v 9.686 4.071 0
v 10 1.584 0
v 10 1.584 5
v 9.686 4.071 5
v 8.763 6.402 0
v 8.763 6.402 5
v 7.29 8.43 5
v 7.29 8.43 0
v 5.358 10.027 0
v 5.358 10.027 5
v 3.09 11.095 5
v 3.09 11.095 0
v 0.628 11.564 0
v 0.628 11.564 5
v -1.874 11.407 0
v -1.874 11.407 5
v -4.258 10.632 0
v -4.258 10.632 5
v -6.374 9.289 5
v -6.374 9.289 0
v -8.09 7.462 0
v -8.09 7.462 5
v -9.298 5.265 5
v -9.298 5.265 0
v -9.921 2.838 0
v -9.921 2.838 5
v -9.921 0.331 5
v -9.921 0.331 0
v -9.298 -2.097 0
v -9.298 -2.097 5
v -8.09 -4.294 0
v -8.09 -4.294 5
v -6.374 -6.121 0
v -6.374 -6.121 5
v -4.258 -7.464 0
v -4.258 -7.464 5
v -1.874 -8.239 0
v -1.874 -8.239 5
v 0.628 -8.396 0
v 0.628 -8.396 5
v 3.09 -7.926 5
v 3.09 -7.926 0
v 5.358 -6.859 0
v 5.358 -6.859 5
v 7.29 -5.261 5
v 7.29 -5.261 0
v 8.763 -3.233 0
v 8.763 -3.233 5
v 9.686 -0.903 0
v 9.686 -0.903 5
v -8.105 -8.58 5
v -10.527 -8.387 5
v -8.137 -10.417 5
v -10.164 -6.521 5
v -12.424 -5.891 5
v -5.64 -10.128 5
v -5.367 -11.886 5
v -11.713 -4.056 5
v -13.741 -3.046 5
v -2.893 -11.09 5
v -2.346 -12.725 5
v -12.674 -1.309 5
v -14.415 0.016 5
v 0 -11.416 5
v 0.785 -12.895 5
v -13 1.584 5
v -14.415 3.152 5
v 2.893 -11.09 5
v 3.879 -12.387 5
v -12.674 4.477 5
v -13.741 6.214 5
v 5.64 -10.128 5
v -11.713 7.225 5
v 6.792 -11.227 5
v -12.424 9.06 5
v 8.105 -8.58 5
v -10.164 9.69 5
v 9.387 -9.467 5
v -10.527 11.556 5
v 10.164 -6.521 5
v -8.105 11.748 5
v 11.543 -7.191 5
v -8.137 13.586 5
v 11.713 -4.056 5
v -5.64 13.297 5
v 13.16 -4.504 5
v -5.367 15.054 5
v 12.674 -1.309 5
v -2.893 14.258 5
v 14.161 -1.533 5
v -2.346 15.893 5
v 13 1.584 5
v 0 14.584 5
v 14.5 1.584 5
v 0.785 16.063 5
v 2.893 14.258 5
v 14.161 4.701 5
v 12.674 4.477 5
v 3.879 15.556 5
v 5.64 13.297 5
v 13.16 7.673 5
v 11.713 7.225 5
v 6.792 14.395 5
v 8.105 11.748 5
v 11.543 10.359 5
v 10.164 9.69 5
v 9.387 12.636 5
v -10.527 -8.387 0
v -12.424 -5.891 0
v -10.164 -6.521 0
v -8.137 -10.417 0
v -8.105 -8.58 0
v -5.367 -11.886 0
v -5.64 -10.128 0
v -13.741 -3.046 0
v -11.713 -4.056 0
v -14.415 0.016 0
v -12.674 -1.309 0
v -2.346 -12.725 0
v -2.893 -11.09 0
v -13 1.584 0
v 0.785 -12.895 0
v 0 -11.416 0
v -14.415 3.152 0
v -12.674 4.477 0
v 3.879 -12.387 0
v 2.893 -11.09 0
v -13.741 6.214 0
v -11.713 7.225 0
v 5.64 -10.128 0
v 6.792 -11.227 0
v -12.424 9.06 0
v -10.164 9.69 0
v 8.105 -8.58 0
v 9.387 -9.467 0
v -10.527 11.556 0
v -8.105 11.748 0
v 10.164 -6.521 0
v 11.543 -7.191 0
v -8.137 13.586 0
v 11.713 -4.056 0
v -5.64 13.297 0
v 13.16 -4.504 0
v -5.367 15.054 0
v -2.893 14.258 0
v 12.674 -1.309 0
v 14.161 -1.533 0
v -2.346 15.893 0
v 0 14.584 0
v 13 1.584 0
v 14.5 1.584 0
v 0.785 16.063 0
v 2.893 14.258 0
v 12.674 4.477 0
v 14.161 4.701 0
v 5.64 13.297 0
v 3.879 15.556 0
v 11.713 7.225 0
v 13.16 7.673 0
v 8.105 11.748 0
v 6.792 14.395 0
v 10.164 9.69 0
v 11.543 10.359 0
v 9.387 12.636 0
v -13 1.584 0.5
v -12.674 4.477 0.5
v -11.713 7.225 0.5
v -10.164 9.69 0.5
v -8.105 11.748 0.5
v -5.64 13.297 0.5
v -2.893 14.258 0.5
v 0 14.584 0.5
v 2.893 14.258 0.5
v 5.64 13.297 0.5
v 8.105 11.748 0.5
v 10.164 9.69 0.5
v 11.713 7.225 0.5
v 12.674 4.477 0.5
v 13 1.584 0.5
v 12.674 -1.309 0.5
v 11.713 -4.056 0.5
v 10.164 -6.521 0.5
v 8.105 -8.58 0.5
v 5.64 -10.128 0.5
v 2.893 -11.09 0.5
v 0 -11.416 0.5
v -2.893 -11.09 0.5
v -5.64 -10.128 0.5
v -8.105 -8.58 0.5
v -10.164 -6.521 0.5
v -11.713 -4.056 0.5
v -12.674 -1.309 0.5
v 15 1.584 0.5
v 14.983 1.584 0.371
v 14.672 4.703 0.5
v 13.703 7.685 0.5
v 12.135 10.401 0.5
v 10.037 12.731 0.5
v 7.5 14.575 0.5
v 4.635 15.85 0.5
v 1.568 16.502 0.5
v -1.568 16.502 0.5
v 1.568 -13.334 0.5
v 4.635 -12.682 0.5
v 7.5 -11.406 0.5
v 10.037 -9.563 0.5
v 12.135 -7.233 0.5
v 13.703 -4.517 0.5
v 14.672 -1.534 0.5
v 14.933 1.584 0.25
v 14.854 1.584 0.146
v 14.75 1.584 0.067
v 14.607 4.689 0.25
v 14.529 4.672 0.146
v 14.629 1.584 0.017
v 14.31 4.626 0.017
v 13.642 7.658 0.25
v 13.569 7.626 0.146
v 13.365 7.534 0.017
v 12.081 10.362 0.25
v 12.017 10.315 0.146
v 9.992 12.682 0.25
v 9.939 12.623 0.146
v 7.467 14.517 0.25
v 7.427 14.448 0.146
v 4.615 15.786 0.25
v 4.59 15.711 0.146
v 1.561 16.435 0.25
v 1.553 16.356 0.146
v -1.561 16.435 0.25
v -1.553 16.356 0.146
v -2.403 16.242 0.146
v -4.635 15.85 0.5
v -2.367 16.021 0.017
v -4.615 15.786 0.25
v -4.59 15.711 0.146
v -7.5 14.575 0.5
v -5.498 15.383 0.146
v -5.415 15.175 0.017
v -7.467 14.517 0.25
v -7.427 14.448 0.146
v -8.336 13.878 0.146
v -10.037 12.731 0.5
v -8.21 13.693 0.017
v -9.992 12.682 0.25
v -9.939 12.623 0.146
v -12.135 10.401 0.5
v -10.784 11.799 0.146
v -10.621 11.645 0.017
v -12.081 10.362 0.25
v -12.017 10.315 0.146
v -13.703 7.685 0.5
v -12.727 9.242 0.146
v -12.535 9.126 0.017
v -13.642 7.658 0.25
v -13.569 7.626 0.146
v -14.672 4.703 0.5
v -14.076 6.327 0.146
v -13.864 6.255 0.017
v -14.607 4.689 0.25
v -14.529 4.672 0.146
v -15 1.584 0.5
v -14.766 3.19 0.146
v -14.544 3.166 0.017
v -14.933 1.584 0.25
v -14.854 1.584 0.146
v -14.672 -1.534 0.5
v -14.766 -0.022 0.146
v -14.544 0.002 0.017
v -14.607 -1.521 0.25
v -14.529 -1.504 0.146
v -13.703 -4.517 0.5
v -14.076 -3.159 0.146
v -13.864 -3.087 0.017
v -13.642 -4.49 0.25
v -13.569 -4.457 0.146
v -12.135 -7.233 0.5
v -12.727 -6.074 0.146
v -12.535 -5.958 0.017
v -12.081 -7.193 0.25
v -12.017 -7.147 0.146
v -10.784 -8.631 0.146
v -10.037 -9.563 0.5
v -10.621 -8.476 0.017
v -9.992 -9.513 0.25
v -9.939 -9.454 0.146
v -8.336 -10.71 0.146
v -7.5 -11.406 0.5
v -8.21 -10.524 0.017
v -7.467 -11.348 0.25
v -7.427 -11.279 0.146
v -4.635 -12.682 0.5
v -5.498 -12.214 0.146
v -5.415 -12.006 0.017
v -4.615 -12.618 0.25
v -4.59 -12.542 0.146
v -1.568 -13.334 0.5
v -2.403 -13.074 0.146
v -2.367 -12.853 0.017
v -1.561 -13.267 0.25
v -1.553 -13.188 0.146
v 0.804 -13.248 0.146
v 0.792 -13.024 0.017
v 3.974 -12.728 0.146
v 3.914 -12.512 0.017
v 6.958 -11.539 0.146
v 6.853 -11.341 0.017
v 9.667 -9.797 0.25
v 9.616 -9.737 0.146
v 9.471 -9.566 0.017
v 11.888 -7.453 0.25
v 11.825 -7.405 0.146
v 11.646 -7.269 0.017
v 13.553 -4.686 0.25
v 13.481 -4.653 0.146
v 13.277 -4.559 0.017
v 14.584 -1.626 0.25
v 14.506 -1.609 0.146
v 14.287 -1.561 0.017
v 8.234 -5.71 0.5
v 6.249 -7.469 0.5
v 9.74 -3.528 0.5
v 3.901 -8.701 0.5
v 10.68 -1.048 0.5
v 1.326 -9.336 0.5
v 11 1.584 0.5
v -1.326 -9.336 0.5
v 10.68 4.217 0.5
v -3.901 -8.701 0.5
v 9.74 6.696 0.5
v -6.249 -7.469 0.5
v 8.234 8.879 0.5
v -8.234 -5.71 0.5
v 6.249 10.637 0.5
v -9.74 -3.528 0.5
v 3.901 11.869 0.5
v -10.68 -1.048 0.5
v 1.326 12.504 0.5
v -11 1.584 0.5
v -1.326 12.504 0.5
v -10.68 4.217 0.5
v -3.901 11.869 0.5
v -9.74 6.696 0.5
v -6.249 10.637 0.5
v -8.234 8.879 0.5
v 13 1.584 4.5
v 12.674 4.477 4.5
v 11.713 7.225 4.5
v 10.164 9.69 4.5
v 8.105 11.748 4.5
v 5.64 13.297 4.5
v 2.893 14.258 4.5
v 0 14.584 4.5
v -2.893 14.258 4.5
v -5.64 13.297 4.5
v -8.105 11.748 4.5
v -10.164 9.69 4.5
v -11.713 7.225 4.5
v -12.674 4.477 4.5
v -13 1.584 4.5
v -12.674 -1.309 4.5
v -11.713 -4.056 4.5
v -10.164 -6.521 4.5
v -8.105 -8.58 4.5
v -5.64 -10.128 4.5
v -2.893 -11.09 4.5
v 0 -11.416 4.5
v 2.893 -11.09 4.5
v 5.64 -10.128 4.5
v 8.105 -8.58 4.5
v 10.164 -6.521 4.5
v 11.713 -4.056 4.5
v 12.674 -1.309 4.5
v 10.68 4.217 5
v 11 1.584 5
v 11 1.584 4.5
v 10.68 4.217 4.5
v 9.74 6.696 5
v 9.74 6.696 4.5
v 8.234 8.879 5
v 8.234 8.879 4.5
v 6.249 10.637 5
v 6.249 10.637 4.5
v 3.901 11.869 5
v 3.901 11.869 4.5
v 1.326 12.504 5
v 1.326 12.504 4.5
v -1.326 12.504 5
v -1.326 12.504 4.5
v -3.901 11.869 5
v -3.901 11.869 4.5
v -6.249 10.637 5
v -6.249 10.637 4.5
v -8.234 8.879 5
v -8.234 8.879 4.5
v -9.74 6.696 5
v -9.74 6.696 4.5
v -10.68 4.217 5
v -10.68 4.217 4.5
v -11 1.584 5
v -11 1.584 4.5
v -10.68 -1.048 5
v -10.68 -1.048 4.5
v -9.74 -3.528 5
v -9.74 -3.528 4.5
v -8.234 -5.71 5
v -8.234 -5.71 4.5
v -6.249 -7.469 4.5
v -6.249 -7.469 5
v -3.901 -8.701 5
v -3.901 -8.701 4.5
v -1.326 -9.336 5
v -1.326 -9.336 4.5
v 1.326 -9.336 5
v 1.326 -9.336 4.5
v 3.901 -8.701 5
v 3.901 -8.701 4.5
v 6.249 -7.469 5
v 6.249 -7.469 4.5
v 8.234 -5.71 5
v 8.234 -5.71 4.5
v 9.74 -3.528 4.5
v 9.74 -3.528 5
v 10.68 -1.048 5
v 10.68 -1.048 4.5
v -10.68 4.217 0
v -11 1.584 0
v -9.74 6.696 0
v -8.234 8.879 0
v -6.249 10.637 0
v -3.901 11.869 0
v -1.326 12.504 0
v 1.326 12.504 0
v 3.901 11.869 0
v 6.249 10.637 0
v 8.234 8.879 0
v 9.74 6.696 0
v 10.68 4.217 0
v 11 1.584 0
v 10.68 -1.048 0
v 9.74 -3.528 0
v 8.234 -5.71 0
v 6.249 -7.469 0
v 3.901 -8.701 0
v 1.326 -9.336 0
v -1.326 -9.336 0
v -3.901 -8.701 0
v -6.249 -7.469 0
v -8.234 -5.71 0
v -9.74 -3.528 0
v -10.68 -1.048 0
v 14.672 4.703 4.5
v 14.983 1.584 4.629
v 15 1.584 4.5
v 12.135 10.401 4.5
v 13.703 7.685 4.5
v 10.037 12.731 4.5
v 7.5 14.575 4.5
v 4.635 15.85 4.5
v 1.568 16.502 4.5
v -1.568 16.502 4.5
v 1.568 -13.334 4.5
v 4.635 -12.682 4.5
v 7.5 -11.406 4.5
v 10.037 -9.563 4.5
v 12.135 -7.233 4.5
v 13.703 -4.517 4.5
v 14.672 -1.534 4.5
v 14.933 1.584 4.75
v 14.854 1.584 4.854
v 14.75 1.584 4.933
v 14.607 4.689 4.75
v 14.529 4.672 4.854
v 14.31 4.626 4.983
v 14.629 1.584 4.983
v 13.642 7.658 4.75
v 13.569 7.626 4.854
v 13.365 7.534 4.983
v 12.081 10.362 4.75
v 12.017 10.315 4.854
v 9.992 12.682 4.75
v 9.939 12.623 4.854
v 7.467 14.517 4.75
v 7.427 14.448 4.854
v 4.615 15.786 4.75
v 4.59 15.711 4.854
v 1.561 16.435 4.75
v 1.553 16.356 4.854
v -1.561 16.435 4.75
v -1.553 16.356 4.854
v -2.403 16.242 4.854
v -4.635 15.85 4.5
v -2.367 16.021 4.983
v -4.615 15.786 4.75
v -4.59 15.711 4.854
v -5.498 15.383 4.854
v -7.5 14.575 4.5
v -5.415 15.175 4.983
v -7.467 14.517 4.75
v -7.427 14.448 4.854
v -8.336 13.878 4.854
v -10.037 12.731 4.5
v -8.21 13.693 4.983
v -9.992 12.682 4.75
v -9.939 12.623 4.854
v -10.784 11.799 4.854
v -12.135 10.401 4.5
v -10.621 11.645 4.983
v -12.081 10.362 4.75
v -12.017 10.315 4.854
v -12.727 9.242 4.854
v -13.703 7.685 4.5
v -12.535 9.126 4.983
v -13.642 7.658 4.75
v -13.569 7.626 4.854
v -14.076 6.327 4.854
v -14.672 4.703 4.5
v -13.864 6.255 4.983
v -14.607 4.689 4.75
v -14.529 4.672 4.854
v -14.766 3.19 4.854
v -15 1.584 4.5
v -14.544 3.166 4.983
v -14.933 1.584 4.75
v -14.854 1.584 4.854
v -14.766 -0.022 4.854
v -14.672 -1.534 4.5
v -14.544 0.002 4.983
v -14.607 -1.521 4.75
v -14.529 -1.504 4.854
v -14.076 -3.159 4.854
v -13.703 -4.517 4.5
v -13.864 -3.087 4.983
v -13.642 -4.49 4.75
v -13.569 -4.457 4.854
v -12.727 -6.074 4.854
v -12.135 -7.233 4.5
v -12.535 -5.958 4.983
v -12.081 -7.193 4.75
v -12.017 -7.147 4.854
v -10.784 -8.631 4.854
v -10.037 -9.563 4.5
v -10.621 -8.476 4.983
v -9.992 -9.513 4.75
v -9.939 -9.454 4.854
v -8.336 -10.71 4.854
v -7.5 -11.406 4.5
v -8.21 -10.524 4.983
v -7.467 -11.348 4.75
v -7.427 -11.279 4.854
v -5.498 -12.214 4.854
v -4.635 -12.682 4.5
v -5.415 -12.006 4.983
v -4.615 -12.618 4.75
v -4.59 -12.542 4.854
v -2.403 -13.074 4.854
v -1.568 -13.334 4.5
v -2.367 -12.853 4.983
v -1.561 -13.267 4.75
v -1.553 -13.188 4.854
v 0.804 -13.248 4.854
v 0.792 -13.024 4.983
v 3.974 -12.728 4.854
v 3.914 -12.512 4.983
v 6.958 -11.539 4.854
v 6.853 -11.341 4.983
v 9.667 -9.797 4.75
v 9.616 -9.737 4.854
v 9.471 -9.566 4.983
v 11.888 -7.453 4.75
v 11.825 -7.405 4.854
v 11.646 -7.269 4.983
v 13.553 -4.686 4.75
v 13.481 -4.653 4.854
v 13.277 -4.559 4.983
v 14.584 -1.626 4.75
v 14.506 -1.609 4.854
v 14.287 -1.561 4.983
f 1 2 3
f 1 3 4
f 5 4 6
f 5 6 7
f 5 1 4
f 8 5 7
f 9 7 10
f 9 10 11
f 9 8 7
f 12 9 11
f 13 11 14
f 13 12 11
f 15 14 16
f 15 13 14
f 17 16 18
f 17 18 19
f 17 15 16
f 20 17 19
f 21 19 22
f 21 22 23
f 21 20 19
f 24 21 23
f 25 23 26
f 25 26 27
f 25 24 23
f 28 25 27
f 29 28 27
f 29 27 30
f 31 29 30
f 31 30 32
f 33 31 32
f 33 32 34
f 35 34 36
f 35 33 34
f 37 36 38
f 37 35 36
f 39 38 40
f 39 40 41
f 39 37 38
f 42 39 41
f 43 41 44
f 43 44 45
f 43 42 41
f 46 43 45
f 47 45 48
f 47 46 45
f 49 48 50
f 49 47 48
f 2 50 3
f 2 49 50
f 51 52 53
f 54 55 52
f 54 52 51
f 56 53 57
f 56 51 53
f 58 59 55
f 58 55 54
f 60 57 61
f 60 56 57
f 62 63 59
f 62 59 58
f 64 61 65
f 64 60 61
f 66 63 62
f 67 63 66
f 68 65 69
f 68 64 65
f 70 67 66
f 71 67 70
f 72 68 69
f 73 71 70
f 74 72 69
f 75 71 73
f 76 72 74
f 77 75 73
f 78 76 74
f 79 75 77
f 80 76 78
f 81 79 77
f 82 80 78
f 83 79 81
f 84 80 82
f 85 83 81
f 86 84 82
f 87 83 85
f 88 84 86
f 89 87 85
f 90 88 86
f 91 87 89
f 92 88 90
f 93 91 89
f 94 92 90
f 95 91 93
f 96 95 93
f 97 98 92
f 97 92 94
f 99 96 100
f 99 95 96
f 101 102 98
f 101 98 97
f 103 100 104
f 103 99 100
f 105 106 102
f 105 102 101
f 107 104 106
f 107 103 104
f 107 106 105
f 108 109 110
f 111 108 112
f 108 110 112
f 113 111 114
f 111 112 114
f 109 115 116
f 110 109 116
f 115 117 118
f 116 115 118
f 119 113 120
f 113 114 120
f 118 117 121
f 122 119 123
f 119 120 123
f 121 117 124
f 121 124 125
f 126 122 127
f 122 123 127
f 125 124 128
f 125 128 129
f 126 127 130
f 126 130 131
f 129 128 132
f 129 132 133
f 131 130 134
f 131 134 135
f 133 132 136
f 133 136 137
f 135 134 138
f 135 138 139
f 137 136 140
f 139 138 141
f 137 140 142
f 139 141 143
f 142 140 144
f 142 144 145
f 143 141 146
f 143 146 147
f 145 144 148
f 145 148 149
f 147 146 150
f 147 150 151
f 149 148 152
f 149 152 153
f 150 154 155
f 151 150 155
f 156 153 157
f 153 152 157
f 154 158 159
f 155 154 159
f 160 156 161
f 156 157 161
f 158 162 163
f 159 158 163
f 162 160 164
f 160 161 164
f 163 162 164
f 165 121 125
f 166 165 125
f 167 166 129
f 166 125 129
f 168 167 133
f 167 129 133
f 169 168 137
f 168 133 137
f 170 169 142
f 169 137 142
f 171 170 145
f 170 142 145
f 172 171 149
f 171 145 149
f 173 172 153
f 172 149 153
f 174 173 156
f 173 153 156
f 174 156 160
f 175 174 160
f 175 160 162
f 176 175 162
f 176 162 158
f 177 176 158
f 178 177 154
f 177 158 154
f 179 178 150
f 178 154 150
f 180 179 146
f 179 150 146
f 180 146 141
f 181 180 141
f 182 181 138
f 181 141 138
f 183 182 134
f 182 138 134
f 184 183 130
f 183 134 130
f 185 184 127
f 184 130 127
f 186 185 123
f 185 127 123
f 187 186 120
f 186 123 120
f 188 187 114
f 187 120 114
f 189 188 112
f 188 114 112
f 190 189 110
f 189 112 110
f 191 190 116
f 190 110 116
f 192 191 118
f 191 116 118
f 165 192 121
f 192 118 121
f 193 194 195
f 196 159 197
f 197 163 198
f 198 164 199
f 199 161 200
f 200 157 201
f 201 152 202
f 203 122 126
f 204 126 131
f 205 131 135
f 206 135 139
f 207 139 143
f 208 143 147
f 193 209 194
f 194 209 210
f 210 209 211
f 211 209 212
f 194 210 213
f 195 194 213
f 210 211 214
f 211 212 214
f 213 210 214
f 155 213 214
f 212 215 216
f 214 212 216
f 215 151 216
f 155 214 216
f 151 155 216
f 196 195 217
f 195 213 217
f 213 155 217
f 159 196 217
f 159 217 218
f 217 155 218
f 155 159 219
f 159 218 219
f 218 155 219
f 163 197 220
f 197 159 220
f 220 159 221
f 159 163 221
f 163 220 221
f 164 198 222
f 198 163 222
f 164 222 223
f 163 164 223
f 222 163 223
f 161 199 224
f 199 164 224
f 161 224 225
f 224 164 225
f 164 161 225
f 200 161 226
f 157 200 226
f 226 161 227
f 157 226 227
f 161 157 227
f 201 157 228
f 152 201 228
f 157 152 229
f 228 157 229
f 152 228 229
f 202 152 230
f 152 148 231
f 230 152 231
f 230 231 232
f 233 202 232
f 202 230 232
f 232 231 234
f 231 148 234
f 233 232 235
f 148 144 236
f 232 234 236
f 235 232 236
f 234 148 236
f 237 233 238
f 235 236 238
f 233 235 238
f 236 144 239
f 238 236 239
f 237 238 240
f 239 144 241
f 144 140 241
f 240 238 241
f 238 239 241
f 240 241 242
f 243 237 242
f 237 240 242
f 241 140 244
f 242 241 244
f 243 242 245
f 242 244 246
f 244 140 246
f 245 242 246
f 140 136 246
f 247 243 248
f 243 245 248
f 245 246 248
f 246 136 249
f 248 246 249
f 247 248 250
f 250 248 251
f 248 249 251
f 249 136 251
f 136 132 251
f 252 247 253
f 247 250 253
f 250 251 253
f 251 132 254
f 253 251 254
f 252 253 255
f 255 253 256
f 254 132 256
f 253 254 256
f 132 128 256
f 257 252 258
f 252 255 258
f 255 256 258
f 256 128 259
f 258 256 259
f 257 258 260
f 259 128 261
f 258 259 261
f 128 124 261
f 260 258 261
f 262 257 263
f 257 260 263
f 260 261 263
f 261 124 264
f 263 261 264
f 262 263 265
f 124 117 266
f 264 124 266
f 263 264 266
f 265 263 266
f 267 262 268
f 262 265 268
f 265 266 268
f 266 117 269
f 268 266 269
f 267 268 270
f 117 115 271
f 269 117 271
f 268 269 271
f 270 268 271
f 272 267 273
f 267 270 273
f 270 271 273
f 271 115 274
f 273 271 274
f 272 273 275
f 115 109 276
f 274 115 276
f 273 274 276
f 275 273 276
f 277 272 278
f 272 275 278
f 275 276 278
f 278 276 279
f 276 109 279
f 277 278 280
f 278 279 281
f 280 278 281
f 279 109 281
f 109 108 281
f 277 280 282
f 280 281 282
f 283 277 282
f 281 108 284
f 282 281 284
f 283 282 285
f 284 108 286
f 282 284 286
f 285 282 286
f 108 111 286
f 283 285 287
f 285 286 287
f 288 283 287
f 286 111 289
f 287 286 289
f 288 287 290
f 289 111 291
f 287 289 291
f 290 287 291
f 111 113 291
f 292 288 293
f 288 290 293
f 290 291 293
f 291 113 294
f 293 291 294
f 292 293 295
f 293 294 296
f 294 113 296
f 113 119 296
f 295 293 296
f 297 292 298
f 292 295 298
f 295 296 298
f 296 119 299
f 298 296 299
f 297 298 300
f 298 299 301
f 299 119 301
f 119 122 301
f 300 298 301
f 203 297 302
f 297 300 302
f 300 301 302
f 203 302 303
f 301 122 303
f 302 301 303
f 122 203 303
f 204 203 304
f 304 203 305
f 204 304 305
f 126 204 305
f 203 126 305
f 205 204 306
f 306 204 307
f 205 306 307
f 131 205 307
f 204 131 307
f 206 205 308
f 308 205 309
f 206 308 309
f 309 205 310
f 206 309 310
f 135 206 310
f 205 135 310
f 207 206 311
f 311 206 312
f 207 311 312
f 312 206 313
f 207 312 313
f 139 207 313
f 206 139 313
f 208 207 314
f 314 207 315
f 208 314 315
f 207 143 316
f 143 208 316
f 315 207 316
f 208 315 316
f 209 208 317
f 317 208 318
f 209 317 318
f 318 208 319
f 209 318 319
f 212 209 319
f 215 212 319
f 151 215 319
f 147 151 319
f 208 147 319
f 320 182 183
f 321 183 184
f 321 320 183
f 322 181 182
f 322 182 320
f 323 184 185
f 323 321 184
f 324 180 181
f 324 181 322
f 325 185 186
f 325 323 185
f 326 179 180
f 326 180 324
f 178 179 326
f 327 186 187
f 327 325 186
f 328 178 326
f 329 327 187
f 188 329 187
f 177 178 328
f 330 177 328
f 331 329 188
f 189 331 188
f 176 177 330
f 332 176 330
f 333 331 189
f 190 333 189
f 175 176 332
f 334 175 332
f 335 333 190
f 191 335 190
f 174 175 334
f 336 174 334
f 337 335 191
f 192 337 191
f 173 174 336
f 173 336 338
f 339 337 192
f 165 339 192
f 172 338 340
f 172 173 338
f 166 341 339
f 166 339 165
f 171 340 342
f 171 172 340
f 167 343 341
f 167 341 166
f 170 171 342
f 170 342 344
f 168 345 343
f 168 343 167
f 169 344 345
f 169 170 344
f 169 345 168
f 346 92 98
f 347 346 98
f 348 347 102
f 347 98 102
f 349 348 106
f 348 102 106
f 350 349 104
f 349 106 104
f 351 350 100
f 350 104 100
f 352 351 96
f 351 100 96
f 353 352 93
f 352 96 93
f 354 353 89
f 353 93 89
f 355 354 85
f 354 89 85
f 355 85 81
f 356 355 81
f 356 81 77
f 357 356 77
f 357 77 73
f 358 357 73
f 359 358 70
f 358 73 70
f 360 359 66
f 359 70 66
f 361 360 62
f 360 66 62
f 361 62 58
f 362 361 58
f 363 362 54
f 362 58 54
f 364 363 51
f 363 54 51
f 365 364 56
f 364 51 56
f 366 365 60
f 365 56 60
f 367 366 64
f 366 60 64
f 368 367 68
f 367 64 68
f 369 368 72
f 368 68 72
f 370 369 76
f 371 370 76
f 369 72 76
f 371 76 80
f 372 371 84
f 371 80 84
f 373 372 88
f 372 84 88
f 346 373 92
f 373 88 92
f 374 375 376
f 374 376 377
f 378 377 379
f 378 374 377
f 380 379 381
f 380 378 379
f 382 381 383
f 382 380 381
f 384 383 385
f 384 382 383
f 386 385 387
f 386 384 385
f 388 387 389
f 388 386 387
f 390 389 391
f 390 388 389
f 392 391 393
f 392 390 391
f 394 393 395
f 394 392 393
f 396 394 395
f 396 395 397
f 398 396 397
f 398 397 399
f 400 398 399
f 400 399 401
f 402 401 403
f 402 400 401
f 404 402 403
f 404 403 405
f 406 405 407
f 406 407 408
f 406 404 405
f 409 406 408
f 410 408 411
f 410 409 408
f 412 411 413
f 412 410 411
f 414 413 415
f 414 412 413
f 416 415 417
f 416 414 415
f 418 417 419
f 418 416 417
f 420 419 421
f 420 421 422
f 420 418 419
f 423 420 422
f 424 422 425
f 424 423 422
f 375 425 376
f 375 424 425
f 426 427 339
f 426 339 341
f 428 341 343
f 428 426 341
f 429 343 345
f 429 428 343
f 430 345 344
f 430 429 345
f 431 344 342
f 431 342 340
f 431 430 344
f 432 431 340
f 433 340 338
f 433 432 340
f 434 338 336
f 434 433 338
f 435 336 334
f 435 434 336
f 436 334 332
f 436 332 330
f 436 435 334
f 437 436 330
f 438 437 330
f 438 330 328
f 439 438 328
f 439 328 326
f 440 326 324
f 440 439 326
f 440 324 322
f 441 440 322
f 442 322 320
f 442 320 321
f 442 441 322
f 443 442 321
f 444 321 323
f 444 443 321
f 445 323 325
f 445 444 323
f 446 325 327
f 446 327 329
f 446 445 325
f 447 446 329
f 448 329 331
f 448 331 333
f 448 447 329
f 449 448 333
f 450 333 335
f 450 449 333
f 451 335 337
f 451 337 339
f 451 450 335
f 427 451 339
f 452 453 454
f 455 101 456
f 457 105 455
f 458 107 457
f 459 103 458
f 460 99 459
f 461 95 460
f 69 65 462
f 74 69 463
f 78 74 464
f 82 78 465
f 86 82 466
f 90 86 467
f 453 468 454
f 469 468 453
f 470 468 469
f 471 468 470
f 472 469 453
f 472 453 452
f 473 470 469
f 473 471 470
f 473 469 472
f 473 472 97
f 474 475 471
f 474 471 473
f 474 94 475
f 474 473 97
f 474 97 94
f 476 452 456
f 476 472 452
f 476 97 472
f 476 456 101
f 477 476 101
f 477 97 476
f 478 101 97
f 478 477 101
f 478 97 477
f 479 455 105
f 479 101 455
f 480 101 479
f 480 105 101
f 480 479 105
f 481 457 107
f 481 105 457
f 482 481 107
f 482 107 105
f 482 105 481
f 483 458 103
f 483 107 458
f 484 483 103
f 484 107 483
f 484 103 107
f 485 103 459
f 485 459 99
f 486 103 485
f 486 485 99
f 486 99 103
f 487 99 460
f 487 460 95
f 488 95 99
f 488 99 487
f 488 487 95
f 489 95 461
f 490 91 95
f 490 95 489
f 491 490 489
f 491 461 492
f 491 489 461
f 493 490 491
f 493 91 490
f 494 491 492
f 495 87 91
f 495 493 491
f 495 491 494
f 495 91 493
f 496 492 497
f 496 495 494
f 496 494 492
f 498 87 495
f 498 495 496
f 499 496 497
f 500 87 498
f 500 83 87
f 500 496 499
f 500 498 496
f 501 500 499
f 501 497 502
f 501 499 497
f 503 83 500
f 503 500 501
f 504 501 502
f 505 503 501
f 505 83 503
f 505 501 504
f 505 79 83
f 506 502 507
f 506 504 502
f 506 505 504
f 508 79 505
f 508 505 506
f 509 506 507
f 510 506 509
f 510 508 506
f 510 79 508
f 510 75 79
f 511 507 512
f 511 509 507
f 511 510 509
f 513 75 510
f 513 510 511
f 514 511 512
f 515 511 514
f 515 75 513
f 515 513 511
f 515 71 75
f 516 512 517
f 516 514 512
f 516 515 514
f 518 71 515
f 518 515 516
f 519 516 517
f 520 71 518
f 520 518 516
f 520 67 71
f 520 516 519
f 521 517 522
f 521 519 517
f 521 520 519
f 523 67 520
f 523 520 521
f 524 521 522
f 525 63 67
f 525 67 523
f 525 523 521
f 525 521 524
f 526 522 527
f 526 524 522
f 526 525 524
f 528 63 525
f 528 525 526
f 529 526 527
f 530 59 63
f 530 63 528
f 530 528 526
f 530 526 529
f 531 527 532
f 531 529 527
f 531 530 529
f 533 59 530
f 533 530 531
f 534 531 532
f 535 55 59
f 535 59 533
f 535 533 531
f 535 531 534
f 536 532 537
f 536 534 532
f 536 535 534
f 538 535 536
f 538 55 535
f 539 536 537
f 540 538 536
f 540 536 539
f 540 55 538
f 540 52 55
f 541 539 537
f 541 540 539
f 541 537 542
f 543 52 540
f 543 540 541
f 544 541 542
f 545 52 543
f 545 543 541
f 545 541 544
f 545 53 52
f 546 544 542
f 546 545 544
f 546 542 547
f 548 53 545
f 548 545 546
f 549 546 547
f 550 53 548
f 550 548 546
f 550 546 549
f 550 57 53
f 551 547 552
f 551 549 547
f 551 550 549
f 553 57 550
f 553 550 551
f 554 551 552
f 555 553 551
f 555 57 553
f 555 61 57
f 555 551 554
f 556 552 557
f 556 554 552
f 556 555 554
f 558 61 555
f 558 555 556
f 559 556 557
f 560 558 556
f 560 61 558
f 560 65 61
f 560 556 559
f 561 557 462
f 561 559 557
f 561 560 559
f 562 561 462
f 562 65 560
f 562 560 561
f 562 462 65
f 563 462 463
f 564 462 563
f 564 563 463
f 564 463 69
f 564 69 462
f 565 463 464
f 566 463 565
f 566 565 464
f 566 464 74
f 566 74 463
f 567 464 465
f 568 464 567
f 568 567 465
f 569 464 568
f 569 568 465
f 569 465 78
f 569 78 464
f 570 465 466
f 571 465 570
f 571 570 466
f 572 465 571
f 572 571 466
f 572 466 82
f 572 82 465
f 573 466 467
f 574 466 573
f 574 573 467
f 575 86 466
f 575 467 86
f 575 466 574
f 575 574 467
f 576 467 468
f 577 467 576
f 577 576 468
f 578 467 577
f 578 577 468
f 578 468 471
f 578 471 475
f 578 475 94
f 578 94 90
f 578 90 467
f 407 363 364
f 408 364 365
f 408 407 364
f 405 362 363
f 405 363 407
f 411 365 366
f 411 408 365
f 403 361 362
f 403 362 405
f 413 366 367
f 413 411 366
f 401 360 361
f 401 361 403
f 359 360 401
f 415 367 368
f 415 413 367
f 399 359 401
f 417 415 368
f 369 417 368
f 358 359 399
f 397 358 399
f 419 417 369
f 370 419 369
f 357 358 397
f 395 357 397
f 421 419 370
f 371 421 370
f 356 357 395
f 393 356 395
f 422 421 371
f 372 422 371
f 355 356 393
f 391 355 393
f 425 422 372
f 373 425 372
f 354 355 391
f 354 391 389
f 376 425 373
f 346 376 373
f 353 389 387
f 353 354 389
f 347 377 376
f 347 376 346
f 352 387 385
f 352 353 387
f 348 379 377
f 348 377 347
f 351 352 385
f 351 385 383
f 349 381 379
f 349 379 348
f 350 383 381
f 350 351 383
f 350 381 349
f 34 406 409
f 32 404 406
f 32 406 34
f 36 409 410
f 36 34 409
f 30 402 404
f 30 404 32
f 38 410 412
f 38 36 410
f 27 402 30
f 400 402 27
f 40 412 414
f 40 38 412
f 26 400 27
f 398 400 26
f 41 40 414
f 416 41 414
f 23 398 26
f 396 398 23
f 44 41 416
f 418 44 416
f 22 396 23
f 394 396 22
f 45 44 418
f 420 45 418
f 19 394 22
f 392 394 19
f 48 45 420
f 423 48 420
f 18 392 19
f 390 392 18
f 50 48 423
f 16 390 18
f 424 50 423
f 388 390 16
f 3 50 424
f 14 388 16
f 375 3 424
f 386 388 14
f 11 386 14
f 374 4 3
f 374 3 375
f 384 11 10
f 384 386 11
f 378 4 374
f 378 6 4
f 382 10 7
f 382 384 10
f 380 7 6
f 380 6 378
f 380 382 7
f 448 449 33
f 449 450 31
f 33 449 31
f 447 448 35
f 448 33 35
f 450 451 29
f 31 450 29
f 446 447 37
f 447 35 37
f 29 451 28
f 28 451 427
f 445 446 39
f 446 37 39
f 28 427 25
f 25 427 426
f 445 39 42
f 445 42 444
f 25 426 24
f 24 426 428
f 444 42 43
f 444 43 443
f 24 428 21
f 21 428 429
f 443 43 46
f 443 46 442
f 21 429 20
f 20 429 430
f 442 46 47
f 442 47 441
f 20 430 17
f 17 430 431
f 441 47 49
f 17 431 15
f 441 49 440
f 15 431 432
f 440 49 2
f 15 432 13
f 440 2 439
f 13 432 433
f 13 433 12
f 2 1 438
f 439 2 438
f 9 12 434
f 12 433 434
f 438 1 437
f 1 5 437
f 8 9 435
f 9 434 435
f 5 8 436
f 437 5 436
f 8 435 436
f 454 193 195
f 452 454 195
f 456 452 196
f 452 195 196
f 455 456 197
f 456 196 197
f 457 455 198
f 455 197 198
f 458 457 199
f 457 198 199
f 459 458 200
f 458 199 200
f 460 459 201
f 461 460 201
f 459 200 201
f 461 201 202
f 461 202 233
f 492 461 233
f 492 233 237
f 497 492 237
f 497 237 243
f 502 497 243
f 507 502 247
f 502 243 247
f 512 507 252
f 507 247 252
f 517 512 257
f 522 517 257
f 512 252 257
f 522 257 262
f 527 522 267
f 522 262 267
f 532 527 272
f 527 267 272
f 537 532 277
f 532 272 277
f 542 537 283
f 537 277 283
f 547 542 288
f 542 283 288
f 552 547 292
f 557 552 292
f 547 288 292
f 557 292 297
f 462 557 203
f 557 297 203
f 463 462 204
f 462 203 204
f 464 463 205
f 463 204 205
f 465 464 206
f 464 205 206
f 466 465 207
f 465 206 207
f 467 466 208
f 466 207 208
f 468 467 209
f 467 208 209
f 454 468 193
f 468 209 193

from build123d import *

# Parameters (mm, degrees)
SKETCH1_R           = 15
SKETCH1_R_2         = 10
BOSS_EXTRUDE1_DEPTH = 5
FILLET1_R           = 0.5
SKETCH2_R           = 13
SKETCH2_R_2         = 11
CUT_EXTRUDE1_DEPTH  = 0.5
SKETCH3_R           = 13
SKETCH3_R_2         = 11
CUT_EXTRUDE2_DEPTH  = 0.5


with BuildPart() as part:
    # Sketch1 → Boss-Extrude1 (new body)
    with BuildSketch(Plane.XY):
        with Locations((0, 1.584180911)):
            Circle(SKETCH1_R)
        with Locations((0, 1.584180911)):
            Circle(SKETCH1_R_2, mode=Mode.SUBTRACT)
    extrude(amount=BOSS_EXTRUDE1_DEPTH)

    # Fillet1
    fillet1_edges = [part.edges().sort_by_distance(p)[0] for p in [
        (-15, 1.584180911, 0),
        (-15, 1.584180911, 5),
    ]]
    fillet(fillet1_edges, radius=FILLET1_R)

    # Sketch2 → Cut-Extrude1 (cut)
    with BuildSketch(Plane.XY.offset(5)):
        with Locations((0, 1.584180911)):
            Circle(SKETCH2_R)
        with Locations((0, 1.584180911)):
            Circle(SKETCH2_R_2, mode=Mode.SUBTRACT)
    extrude(amount=-CUT_EXTRUDE1_DEPTH, mode=Mode.SUBTRACT)

    # Sketch3 → Cut-Extrude2 (cut)
    with BuildSketch(Plane(origin=(0, 0, 0), x_dir=(-1, 0, 0), z_dir=(0, 0, -1))):
        with Locations((0, 1.584180911)):
            Circle(SKETCH3_R)
        with Locations((0, 1.584180911)):
            Circle(SKETCH3_R_2, mode=Mode.SUBTRACT)
    extrude(amount=-CUT_EXTRUDE2_DEPTH, mode=Mode.SUBTRACT)


solid = part.part
